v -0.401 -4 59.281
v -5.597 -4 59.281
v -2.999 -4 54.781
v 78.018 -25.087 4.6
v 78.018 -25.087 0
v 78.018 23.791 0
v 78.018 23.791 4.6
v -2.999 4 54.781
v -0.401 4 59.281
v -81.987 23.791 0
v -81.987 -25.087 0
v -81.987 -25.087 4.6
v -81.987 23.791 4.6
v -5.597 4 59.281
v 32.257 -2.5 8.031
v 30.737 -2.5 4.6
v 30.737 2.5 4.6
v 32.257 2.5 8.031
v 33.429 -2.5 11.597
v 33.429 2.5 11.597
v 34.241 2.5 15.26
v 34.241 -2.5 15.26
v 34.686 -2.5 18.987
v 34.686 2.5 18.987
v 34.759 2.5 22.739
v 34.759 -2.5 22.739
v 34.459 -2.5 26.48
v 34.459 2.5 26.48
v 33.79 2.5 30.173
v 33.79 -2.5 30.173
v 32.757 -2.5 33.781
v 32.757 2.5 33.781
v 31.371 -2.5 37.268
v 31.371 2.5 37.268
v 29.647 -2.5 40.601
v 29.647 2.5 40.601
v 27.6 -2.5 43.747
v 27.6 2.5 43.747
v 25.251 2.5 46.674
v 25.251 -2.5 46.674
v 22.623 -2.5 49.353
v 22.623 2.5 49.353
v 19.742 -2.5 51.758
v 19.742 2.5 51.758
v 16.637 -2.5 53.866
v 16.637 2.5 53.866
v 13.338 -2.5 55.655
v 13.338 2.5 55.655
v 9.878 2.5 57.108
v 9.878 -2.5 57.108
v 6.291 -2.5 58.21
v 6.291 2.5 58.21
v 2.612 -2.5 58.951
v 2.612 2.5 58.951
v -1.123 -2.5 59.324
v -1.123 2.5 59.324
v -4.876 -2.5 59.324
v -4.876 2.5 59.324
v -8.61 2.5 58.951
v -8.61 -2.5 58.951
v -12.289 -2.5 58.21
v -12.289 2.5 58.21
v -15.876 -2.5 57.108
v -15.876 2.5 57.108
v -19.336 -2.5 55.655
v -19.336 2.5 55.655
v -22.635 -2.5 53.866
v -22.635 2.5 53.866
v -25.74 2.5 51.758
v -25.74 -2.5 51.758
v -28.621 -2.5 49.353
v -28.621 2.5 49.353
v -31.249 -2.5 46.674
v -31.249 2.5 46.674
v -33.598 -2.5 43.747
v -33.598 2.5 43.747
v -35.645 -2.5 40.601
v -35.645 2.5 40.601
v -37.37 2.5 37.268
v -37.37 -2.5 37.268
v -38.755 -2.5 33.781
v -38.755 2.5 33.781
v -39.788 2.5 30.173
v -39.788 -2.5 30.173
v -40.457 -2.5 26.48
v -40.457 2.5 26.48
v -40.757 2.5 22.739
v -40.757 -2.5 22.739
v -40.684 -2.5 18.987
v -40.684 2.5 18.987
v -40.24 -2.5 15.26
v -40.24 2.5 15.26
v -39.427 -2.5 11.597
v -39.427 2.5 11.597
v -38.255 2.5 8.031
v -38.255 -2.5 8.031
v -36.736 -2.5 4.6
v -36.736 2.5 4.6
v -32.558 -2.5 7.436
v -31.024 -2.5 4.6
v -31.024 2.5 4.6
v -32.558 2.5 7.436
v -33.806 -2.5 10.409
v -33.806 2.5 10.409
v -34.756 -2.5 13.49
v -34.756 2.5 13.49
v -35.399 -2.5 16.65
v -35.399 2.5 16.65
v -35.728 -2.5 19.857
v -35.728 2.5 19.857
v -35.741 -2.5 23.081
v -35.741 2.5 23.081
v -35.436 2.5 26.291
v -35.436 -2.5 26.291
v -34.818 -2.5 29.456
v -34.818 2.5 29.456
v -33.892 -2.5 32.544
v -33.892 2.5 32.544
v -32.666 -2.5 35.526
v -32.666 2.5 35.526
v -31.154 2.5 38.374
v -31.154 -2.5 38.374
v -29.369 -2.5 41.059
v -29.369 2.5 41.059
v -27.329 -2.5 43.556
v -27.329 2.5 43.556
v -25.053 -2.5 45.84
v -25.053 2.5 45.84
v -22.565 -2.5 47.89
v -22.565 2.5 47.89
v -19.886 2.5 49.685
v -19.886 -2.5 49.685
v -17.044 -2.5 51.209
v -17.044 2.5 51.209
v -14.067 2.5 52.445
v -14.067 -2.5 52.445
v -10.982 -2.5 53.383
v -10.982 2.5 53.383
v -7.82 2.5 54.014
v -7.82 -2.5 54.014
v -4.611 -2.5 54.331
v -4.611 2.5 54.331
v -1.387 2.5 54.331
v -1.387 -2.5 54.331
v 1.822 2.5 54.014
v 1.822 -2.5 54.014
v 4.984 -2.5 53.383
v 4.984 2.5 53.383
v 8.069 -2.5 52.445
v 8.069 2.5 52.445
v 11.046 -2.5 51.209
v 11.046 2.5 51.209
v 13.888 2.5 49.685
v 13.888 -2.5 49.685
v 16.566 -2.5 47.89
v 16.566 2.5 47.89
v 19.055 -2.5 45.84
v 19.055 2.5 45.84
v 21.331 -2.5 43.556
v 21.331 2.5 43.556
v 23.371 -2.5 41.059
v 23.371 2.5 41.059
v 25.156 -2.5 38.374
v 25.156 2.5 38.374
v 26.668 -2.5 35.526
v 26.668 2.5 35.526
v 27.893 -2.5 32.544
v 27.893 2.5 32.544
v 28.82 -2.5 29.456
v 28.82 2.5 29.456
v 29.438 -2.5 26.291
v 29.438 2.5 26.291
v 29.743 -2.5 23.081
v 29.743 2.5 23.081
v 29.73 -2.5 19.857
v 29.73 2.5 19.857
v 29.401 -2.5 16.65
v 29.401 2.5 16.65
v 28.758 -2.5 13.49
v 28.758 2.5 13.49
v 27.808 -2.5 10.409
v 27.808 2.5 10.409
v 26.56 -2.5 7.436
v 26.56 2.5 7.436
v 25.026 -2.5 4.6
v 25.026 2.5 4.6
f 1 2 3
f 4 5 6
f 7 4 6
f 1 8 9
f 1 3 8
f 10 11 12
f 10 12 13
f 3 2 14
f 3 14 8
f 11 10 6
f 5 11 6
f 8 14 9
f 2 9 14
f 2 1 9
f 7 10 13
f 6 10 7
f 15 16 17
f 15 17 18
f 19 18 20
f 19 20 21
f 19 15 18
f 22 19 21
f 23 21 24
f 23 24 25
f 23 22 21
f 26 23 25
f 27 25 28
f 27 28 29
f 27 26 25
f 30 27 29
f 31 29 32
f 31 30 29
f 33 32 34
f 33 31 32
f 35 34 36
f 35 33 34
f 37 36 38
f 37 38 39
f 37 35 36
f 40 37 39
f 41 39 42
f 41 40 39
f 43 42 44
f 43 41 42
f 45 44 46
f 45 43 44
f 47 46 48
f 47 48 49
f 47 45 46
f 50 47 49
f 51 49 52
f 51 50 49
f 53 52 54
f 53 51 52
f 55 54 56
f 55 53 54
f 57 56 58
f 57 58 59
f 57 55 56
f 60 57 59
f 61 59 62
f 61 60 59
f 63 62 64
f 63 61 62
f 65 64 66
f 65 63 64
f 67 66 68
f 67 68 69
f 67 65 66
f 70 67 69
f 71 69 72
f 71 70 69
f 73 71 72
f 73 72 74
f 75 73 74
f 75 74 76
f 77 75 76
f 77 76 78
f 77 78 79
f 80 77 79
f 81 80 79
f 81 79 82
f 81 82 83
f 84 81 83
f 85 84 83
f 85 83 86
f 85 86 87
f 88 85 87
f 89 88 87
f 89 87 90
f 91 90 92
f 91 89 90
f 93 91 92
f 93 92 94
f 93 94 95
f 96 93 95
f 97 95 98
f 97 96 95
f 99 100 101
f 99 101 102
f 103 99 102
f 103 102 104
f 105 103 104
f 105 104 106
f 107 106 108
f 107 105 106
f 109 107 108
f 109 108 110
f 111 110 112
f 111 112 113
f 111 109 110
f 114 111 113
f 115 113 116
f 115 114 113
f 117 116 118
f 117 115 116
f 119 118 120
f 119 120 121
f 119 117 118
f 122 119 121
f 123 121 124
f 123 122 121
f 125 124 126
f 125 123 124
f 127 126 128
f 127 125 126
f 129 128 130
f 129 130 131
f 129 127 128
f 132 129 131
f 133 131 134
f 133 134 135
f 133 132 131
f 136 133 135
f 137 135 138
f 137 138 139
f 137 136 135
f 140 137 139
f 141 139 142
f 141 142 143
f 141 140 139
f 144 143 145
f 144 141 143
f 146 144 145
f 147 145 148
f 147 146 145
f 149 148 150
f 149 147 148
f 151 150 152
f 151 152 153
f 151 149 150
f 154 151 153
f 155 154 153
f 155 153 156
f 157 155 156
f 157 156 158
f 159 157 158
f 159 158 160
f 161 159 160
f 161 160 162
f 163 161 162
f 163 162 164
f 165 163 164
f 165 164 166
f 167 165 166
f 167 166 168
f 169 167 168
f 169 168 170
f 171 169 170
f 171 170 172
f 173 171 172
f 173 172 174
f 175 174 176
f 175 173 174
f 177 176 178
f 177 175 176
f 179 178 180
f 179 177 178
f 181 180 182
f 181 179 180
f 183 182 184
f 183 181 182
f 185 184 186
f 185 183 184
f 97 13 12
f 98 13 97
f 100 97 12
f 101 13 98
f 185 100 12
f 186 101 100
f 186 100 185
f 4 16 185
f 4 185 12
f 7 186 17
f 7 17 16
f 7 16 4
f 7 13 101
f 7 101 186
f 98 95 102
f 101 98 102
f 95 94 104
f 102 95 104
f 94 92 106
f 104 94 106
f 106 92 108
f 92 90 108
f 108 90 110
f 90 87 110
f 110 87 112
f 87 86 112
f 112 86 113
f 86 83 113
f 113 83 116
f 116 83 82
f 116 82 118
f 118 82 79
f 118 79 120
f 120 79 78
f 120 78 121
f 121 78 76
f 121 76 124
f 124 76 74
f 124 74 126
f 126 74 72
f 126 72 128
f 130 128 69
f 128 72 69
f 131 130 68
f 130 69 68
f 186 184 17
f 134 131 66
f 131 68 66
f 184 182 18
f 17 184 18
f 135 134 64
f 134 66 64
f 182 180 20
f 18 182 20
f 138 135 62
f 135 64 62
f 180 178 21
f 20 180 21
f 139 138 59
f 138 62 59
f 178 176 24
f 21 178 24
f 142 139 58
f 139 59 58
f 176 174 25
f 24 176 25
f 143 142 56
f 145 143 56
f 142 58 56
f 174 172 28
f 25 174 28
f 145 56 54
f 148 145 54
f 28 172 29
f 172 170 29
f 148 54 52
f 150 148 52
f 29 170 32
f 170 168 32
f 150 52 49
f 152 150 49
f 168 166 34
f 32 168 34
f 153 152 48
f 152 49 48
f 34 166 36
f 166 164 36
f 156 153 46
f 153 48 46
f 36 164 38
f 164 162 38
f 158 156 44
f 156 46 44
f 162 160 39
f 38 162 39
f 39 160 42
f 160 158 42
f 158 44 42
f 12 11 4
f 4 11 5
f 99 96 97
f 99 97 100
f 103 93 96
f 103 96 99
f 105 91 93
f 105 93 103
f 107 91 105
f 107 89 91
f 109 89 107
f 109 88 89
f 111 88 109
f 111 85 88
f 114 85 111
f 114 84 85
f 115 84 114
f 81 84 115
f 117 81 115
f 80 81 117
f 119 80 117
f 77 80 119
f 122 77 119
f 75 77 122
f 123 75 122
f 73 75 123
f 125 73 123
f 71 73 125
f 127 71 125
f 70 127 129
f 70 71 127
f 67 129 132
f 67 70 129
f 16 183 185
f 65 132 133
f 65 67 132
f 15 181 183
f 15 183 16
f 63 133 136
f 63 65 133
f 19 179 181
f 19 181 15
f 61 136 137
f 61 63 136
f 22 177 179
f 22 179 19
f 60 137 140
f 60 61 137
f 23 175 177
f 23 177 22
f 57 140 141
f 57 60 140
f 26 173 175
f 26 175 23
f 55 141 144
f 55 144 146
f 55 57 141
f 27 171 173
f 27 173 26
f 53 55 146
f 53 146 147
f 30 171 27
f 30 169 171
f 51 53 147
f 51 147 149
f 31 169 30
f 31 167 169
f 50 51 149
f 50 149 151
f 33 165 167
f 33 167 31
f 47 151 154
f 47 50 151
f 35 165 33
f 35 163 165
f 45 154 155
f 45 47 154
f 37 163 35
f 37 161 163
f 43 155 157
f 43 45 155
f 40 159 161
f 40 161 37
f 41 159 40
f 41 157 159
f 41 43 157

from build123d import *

# Parameters (mm, degrees)
F0_W     = 160.004504025
F0_H     = 48.8786567003
F1_DEPTH = 4.6
F3_DEPTH = 2.5
F5_DEPTH = 4


with BuildPart() as f1:
    # F0 (on Top) → F1 (new body)
    with BuildSketch(Plane.XY):
        with Locations((-1.9843913615, -0.6480617449)):
            Rectangle(F0_W, F0_H)
    extrude(amount=F1_DEPTH)

    # F2 (on Front) → F3 (join, symmetric)
    with BuildSketch(Plane.XZ):
        with BuildLine():
            Line((24.532993235, 3.8127584849), (28.7331058198, 1.1000007967))
            ThreePointArc((28.7331058198, 1.1000007967), (-2.9990799239, 59.3705006022), (-34.7312656677, 1.1000007967))
            Line((-34.7312656677, 1.1000007967), (-30.5311530828, 3.8127584849))
            ThreePointArc((-30.5311530828, 3.8127584849), (-2.9990799239, 54.3705006022), (24.532993235, 3.8127584849))
        make_face()
    extrude(amount=F3_DEPTH, both=True)


with BuildPart() as f5:
    # F4 (on face) → F5 (new body, symmetric)
    with BuildSketch(Plane.XZ.offset(2.5)):
        Polygon((-0.4010040498, 59.2810508121), (-5.5971564725, 59.2810508121), (-2.9990802612, 54.7810508121), align=None)
    extrude(amount=F5_DEPTH, both=True)


with BuildPart() as f5_1:
    # F6: moved
    add(f5.part.moved(Location((0, 2.5, 0))))


solid = Compound([f1.part, f5_1.part])
